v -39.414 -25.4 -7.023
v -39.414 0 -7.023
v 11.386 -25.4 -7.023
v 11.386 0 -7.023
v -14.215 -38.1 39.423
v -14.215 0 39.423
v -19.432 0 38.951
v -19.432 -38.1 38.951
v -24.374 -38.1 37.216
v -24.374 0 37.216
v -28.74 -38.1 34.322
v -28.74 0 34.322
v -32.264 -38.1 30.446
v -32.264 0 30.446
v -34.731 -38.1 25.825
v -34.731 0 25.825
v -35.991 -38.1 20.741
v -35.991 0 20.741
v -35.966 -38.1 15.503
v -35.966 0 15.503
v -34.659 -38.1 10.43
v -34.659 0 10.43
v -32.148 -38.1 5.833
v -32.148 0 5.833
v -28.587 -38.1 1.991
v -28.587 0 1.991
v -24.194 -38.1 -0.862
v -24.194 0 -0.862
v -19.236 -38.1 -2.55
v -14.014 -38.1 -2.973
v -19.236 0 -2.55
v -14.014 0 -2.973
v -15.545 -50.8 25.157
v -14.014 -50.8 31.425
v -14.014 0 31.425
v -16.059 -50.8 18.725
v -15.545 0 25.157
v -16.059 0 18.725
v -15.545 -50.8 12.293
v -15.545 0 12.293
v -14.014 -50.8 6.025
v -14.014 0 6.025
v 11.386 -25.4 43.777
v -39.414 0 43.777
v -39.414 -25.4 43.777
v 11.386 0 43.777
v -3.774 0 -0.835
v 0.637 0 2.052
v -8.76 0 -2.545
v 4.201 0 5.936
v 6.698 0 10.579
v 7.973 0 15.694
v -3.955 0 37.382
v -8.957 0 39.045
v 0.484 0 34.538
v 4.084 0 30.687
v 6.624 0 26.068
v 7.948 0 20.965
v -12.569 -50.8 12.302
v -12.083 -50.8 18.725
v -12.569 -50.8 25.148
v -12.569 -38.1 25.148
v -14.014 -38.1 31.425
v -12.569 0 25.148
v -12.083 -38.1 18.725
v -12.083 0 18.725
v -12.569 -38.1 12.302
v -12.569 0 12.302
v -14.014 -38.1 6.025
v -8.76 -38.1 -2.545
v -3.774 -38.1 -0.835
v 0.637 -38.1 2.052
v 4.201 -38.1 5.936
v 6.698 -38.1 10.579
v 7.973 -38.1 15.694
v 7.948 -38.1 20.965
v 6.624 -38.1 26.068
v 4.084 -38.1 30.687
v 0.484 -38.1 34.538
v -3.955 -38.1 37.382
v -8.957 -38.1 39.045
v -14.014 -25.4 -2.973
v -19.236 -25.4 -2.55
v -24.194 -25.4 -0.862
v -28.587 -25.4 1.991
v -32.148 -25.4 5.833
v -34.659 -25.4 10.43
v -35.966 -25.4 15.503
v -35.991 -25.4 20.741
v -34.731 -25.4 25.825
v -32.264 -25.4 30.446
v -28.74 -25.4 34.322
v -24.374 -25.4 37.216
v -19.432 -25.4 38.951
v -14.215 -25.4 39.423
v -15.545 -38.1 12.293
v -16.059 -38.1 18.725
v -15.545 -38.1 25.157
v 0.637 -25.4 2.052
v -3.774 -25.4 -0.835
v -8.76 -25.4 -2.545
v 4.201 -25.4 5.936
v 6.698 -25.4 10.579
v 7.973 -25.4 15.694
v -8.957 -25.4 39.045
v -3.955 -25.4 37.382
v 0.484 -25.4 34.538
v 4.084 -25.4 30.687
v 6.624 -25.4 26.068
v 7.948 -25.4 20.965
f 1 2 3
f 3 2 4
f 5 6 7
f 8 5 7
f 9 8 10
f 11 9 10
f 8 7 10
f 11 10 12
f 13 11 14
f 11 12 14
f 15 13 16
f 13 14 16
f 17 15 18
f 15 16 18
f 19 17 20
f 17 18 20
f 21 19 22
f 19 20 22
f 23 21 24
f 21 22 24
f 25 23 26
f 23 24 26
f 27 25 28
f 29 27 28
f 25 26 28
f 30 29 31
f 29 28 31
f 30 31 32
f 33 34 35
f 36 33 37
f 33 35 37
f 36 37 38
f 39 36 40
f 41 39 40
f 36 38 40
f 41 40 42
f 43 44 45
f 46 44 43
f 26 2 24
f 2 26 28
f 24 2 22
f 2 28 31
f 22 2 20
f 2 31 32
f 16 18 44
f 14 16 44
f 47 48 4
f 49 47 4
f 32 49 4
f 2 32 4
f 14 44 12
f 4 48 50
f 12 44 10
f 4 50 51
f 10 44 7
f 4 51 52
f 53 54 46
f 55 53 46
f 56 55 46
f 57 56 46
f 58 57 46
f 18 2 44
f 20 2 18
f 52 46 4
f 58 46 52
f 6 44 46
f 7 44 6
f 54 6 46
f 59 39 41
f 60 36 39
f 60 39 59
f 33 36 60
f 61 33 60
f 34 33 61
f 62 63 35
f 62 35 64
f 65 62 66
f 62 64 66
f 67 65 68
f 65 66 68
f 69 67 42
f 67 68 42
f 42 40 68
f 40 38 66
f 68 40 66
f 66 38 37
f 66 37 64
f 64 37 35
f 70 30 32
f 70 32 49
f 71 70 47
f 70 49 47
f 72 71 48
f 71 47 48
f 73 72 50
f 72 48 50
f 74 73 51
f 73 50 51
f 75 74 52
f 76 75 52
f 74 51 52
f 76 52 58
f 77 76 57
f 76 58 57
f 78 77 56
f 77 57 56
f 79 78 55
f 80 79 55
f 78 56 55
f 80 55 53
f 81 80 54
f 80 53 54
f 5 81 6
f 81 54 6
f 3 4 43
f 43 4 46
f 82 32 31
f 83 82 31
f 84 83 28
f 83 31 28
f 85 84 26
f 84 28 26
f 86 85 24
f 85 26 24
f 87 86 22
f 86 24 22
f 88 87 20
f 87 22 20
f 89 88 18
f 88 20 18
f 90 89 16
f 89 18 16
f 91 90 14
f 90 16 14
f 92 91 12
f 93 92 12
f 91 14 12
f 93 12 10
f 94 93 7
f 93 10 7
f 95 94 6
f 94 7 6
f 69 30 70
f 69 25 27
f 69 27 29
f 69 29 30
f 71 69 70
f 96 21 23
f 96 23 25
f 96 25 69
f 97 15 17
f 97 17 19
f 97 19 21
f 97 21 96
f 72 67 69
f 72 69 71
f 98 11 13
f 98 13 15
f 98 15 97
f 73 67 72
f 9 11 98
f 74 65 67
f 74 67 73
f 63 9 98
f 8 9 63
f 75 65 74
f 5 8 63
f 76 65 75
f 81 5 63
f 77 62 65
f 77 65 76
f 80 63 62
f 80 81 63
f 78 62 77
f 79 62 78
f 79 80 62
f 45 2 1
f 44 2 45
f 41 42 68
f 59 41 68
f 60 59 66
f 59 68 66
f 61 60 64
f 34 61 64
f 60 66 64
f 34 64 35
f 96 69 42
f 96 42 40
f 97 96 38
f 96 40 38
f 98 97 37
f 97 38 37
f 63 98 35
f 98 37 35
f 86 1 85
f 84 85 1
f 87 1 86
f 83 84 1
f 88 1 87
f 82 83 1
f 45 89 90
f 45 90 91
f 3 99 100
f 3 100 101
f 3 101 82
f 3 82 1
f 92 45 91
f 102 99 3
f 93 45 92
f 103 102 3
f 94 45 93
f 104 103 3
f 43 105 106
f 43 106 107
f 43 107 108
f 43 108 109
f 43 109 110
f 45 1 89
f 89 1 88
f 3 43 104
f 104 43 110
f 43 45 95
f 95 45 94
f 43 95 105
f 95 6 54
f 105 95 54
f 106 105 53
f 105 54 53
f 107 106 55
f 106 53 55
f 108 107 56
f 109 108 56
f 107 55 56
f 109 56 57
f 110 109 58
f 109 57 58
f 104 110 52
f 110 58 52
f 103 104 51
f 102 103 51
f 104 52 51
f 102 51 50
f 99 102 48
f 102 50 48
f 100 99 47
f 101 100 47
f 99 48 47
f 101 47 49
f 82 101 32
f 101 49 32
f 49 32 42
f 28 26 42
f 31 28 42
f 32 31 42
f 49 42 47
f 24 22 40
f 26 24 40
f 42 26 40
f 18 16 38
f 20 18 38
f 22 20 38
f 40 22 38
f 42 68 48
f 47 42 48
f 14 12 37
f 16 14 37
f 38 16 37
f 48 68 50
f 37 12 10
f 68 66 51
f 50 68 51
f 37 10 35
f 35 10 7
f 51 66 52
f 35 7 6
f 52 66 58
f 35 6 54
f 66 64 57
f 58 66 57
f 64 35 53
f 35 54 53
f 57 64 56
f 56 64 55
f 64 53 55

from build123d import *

# Parameters (mm, degrees)
F0_W     = 50.8
F0_H     = 50.8
F1_DEPTH = 25.4
F2_DEPTH = 50.8
F3_DEPTH = 38.1


with BuildPart() as f1:
    # F0 (on Front) → F1 (new body)
    with BuildSketch(Plane.XZ):
        with Locations((-14.014424, 18.376913)):
            Rectangle(F0_W, F0_H)
        with BuildLine():
            ThreePointArc((-14.014424, -2.972908), (-36.140851, 18.121002), (-14.21502, 39.423343))
            ThreePointArc((-14.21502, 39.423343), (8.124533, 18.330441), (-14.014424, -2.972908))
        make_face(mode=Mode.SUBTRACT)
    extrude(amount=F1_DEPTH)


with BuildPart() as f2:
    # F0 (on Front) → F2 (new body)
    with BuildSketch(Plane.XZ):
        with BuildLine():
            ThreePointArc((-14.014424, 31.425135), (-16.059254, 18.725135), (-14.014424, 6.025135))
            ThreePointArc((-14.014424, 6.025135), (-12.083005, 18.725135), (-14.014424, 31.425135))
        make_face()
    extrude(amount=F2_DEPTH)


with BuildPart() as f3:
    # F0 (on Front) → F3 (new body)
    with BuildSketch(Plane.XZ):
        with BuildLine():
            ThreePointArc((-14.014424, -2.972908), (8.124533, 18.330441), (-14.21502, 39.423343))
            ThreePointArc((-14.21502, 39.423343), (-36.140851, 18.121002), (-14.014424, -2.972908))
        make_face()
        with BuildLine():
            ThreePointArc((-14.014424, 31.425135), (-12.083005, 18.725135), (-14.014424, 6.025135))
            ThreePointArc((-14.014424, 6.025135), (-16.059254, 18.725135), (-14.014424, 31.425135))
        make_face(mode=Mode.SUBTRACT)
    extrude(amount=F3_DEPTH)


solid = Compound([f1.part, f2.part, f3.part])
